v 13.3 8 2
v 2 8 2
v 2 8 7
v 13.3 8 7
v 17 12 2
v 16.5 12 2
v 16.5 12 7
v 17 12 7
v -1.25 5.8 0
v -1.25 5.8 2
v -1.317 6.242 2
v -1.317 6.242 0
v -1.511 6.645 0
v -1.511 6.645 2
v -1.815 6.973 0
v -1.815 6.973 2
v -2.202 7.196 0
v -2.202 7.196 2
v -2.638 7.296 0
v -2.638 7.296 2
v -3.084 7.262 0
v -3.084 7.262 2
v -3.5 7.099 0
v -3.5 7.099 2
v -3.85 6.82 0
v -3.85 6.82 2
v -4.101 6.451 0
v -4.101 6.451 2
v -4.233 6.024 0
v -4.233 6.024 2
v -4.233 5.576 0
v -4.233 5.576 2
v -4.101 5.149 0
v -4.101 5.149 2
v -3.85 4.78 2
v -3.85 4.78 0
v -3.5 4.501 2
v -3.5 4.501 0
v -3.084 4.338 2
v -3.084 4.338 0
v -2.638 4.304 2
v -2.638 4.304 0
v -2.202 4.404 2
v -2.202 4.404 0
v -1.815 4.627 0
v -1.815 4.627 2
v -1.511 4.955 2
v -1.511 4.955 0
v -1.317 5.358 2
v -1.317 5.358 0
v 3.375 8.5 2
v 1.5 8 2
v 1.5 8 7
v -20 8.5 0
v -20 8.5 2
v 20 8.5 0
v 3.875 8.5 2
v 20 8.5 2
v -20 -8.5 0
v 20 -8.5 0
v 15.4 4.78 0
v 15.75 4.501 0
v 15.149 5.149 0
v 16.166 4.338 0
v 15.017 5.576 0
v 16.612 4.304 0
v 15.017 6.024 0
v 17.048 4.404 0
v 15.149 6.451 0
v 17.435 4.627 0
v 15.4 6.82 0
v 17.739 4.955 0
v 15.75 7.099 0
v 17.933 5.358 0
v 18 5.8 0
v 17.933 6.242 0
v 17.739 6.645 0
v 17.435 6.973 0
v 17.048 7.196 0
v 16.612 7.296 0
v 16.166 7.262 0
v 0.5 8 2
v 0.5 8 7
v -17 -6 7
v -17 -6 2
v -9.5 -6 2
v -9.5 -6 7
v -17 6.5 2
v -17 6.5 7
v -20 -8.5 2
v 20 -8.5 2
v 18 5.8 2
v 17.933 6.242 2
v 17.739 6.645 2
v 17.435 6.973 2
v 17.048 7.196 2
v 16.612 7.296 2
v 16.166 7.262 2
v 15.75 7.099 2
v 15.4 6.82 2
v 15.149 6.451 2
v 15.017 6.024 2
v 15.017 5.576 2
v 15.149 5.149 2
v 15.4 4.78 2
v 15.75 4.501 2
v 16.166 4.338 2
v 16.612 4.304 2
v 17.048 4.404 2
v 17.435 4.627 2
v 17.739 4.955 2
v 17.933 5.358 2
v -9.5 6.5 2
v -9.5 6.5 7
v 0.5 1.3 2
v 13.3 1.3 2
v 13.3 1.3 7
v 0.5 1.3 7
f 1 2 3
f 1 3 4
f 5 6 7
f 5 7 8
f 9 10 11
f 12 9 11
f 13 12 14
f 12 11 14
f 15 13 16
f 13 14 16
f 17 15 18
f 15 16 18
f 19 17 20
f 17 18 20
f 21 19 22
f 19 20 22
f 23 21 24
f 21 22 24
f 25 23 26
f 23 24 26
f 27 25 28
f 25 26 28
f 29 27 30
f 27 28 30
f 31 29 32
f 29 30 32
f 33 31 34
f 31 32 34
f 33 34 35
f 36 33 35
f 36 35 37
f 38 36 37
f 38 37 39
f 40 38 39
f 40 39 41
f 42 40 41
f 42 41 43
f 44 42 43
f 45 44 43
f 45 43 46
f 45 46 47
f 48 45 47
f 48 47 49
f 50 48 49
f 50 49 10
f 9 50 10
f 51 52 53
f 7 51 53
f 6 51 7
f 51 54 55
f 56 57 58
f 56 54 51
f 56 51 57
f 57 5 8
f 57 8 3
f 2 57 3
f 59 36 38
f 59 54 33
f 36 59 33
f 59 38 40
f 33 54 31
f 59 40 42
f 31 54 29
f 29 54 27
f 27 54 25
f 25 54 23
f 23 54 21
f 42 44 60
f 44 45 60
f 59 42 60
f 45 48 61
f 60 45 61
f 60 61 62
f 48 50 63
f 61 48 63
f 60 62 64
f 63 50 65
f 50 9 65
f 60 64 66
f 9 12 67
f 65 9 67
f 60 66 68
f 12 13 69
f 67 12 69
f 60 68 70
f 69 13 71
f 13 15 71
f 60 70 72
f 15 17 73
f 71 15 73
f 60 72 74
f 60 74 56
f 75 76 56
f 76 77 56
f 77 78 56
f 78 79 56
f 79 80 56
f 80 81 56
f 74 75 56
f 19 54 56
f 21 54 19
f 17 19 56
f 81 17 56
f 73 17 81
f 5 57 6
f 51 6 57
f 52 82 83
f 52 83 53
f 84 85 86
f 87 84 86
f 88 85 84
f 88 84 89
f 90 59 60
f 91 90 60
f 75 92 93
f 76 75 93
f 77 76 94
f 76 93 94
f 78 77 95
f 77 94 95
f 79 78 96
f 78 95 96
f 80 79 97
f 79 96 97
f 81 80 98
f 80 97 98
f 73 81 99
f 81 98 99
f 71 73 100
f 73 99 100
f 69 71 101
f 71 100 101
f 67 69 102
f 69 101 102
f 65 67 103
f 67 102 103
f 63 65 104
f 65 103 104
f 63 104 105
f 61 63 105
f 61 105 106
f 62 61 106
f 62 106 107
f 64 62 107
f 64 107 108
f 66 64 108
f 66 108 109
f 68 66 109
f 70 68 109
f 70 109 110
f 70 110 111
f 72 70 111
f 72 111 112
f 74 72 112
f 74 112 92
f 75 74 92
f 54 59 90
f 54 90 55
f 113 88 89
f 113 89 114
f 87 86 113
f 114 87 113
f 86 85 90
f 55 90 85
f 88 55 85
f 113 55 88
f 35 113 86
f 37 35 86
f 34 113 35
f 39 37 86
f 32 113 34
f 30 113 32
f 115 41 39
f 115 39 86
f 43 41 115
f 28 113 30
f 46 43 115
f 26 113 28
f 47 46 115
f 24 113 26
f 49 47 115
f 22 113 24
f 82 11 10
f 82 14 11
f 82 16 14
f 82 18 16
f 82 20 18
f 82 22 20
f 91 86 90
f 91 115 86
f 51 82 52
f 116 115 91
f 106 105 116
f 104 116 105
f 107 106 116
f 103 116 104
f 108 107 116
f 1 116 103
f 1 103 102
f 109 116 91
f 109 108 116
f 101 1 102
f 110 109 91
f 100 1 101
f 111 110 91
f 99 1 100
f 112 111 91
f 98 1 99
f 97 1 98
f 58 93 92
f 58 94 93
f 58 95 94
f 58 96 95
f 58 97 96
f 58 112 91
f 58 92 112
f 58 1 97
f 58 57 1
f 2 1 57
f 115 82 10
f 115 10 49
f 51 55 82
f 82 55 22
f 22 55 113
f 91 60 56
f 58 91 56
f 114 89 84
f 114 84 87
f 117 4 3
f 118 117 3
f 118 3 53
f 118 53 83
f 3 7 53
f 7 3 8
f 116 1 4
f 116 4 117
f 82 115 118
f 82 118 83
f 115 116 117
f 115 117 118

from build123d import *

# Parameters (mm, degrees)
S_LIMITSWITCH_W = 40
S_LIMITSWITCH_H = 17
PAD024_DEPTH    = 2
SKETCH053_W     = 7.5
SKETCH053_H     = 12.5
PAD025_DEPTH    = 5
SKETCH054_R     = 1.5
POCKET029_DEPTH = 5


with BuildPart() as part:
    # S_LimitSwitch → Pad024 (new body)
    with BuildSketch(Plane.XY):
        Rectangle(S_LIMITSWITCH_W, S_LIMITSWITCH_H)
    extrude(amount=PAD024_DEPTH)

    # Sketch053 → Pad025 (join)
    with BuildSketch(Plane.XY.offset(2)):
        Polygon((13.3, 8), (13.3, 1.3), (0.5, 1.3), (0.5, 8), (1.5, 8), (16.5, 12), (17, 12), (2, 8), align=None)
        with Locations((-13.25, 0.25)):
            Rectangle(SKETCH053_W, SKETCH053_H)
    extrude(amount=PAD025_DEPTH)

    # Sketch054 → Pocket029 (cut)
    with BuildSketch(Plane.XY.offset(3)):
        with Locations((16.5, 5.8)):
            Circle(SKETCH054_R)
        with Locations((-2.75, 5.8)):
            Circle(SKETCH054_R)
    extrude(amount=-POCKET029_DEPTH, mode=Mode.SUBTRACT)


solid = part.part
